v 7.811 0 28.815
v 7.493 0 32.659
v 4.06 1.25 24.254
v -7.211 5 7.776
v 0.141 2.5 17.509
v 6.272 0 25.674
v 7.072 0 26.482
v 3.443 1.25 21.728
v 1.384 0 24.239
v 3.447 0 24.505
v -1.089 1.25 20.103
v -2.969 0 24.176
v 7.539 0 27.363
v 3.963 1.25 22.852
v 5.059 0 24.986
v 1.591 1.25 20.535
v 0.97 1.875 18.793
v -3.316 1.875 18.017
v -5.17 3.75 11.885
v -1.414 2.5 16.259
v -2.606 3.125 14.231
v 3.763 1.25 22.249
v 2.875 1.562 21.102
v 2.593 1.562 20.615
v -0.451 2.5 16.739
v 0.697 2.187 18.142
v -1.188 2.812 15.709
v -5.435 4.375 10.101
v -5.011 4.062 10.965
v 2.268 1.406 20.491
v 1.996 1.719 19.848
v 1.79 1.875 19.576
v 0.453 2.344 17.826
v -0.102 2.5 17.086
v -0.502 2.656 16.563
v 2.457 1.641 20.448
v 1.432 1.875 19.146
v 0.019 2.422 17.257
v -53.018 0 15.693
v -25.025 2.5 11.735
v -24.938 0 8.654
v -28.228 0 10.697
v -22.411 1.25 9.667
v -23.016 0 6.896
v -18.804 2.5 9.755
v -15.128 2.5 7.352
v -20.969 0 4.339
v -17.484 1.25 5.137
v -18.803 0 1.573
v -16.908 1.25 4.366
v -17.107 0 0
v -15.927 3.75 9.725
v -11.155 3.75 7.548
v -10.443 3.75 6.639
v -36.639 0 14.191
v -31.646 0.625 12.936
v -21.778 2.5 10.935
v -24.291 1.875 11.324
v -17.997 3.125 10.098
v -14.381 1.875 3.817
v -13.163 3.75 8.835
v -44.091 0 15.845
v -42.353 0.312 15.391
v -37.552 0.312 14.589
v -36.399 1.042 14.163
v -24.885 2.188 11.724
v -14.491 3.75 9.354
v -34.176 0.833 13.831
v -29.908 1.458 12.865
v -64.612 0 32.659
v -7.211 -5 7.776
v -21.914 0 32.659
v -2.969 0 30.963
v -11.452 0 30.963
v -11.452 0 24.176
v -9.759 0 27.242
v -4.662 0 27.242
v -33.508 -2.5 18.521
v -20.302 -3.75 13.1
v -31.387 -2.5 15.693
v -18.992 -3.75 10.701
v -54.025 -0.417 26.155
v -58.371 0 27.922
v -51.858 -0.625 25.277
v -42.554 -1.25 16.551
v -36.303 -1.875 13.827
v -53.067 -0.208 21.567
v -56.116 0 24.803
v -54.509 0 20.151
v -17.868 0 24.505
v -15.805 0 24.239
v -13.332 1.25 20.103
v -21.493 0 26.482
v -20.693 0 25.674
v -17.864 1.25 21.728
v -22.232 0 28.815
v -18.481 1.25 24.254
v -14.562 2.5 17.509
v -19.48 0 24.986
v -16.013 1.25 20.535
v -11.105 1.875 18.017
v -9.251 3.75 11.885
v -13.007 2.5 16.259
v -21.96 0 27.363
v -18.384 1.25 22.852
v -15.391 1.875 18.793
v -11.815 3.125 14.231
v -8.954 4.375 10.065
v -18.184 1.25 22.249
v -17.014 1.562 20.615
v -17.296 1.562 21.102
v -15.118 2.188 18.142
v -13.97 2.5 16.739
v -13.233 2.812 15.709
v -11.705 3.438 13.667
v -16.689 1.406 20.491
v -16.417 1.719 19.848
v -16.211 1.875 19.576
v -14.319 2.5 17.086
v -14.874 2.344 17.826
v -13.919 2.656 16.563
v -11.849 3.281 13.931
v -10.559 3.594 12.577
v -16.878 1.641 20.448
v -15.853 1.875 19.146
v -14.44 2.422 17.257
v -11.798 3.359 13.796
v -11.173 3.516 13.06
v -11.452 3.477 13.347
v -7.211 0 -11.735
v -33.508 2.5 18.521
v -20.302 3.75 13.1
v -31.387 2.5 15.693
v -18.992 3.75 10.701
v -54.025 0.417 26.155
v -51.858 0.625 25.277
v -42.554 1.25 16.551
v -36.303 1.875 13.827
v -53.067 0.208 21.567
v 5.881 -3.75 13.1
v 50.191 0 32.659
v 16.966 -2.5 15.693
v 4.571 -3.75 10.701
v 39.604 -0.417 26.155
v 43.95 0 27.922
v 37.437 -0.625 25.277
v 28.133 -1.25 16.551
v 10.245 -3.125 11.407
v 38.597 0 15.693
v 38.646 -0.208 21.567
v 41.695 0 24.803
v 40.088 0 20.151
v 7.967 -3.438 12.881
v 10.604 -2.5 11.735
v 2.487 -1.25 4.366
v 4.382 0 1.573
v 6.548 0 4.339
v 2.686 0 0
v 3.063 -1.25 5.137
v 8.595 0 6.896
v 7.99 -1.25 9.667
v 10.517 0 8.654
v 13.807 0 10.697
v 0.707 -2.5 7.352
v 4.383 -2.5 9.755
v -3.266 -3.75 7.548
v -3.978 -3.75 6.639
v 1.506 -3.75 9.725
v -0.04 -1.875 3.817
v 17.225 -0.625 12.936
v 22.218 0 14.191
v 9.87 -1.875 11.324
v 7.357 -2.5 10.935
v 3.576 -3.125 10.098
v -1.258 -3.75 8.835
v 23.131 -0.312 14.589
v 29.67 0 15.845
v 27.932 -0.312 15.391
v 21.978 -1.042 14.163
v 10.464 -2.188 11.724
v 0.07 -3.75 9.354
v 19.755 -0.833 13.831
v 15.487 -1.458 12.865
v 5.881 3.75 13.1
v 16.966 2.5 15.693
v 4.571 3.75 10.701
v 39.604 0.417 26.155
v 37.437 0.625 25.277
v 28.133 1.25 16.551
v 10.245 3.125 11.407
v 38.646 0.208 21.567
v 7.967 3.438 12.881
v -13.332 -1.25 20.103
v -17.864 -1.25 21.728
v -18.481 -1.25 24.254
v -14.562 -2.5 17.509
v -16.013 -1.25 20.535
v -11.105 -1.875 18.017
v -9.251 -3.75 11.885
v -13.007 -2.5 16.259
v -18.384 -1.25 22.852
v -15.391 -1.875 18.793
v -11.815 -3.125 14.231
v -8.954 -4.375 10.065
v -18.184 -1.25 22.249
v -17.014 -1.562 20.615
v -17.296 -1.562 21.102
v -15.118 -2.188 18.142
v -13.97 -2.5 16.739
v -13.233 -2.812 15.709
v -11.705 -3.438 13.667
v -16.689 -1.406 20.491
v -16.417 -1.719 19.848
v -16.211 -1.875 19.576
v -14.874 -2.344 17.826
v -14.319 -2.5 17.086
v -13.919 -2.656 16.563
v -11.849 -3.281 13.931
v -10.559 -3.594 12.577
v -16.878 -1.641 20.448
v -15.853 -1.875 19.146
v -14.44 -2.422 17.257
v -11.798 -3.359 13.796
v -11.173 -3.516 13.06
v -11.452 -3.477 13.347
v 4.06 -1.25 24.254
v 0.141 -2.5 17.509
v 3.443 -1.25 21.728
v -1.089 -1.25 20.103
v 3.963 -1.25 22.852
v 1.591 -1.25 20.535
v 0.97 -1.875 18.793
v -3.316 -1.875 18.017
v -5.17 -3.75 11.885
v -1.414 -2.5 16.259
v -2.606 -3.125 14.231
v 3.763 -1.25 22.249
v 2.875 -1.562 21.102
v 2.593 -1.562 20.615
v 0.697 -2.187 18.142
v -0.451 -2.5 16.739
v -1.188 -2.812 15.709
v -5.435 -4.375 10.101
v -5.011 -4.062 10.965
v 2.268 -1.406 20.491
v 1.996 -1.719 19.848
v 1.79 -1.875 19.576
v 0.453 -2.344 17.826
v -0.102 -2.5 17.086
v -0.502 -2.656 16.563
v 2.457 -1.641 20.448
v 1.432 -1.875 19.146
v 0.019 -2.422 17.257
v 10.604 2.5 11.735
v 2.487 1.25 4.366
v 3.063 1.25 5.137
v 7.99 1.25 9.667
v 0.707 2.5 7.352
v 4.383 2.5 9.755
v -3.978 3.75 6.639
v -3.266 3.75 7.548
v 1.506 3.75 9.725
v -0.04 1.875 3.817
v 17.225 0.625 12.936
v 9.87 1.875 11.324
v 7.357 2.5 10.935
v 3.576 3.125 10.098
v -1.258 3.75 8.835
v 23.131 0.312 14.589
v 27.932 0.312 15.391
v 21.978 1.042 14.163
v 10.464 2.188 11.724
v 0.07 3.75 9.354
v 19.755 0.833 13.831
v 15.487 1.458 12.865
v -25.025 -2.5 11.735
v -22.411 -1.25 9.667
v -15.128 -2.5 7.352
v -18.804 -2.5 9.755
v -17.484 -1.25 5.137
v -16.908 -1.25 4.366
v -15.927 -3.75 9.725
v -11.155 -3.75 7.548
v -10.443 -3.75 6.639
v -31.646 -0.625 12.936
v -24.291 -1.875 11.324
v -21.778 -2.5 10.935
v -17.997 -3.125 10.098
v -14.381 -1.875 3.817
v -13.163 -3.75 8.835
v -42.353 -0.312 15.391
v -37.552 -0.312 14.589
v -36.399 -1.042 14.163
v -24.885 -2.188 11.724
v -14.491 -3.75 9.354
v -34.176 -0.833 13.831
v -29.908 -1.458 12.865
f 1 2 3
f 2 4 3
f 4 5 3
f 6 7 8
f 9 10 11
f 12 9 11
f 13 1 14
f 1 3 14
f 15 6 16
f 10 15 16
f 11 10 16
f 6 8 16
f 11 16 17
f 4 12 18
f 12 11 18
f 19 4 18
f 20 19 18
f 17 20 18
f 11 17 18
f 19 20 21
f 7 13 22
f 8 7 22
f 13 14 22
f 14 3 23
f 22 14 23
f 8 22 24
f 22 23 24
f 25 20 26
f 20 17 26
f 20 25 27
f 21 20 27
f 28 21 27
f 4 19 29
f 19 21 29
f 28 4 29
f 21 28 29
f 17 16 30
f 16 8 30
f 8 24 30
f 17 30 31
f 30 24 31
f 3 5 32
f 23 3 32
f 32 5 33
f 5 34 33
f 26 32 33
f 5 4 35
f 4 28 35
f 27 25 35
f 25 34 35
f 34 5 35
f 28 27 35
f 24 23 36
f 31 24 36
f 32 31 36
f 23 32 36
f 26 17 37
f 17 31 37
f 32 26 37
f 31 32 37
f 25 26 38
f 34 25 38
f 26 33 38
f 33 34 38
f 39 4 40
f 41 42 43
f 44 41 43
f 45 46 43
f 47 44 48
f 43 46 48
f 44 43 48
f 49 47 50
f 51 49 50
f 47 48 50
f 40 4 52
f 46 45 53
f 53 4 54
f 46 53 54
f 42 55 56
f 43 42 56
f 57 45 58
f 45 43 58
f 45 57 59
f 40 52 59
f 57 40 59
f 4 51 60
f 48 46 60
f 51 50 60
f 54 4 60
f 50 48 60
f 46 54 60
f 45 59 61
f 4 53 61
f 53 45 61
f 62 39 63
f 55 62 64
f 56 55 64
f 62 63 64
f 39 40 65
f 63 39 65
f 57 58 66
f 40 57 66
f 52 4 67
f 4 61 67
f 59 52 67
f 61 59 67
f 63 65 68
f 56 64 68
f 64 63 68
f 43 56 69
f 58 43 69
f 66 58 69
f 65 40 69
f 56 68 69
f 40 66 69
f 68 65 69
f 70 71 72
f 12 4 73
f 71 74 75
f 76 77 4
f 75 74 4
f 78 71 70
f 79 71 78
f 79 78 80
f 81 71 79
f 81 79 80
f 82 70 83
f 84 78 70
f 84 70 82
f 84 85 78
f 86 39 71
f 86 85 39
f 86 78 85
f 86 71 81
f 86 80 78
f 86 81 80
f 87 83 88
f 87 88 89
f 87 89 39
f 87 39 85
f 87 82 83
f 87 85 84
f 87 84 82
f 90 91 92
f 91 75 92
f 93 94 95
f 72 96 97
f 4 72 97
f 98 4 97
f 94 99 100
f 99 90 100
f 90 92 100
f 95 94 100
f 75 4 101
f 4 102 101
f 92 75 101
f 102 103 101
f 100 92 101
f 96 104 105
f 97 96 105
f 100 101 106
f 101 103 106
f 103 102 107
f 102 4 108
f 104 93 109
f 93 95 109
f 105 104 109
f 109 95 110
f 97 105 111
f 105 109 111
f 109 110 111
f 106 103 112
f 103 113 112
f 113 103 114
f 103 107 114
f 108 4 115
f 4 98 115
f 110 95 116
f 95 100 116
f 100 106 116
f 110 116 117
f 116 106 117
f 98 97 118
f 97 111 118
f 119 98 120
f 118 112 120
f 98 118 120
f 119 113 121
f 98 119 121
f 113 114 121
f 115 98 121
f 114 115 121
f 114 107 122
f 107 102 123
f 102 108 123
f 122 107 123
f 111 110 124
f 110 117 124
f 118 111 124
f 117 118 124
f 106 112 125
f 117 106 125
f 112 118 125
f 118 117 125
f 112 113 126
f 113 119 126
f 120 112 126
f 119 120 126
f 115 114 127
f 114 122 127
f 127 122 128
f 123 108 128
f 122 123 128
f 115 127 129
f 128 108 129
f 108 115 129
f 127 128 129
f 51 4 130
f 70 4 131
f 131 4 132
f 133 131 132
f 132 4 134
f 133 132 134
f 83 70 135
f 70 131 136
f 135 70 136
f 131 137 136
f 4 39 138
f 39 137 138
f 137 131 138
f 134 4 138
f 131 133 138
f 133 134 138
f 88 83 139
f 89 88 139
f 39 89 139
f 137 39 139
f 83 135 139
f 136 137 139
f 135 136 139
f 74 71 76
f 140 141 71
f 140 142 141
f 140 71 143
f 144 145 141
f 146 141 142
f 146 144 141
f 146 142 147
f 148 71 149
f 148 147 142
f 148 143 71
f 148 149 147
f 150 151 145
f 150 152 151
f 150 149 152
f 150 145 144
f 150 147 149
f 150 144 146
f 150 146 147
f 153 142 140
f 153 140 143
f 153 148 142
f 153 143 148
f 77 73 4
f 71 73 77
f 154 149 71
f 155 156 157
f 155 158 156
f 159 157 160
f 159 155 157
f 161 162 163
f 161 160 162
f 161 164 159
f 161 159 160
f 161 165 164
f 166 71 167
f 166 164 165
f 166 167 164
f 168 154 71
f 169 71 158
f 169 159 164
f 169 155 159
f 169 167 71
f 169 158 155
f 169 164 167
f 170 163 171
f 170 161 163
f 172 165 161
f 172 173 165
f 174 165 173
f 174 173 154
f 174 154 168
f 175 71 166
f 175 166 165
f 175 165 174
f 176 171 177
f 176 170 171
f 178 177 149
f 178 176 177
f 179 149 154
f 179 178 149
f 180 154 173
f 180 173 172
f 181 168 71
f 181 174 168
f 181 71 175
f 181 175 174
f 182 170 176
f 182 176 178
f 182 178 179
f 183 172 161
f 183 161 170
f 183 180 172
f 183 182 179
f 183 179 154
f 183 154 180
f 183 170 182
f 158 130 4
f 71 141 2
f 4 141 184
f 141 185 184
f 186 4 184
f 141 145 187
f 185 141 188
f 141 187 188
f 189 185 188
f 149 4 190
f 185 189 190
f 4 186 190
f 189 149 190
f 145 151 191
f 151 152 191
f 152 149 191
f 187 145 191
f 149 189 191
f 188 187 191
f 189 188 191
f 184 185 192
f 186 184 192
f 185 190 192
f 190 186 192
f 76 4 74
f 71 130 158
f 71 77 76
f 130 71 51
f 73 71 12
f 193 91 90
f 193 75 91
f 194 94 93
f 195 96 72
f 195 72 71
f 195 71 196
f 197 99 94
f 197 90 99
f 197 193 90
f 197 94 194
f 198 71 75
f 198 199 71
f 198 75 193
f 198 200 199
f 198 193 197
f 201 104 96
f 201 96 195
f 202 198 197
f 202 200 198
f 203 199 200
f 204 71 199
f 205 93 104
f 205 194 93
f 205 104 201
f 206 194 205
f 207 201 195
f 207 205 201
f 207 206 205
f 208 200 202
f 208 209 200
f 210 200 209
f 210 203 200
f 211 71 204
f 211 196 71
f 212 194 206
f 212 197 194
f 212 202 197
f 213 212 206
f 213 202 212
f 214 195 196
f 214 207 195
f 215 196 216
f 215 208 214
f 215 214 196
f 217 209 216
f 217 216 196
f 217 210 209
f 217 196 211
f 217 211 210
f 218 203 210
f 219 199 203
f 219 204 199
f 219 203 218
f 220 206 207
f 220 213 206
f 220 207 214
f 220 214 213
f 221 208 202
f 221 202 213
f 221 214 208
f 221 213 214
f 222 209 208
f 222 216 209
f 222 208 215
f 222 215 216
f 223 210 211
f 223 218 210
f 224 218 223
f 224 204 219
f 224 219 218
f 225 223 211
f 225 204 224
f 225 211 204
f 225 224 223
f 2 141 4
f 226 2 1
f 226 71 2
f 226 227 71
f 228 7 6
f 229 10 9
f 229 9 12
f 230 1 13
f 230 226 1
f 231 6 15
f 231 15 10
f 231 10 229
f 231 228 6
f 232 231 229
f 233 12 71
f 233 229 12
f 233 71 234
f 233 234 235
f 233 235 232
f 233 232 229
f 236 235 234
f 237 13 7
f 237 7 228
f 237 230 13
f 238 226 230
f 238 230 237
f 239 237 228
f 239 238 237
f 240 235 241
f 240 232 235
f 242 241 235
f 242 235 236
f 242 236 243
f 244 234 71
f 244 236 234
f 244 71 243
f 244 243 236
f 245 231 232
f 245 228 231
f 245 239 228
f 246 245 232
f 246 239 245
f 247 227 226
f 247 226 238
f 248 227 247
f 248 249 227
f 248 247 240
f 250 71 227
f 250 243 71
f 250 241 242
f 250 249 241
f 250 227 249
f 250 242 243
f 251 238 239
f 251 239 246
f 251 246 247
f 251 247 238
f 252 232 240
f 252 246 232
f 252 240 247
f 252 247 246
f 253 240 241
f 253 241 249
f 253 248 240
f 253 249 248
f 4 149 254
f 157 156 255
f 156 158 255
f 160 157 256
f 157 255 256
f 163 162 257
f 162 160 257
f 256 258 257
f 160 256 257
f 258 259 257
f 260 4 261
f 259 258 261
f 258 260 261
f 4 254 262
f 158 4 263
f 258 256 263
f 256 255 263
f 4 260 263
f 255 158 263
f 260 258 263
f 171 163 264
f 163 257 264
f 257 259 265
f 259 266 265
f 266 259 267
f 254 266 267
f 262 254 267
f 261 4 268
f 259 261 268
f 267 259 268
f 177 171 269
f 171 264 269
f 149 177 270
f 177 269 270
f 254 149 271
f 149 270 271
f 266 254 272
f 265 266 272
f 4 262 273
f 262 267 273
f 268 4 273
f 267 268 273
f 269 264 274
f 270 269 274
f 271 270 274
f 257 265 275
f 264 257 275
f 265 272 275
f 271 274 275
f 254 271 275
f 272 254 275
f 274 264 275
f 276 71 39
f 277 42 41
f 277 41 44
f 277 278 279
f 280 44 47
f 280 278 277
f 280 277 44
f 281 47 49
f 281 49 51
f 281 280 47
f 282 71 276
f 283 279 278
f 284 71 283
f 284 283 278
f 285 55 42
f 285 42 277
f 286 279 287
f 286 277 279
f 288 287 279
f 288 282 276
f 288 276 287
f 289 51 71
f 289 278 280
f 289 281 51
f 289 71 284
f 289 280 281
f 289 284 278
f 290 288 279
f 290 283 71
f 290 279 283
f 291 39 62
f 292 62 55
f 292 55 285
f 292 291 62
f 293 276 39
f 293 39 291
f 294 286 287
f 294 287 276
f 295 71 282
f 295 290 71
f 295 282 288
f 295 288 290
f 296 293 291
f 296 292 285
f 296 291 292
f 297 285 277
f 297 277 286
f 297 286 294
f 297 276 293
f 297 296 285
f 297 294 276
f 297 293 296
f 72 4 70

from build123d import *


with BuildPart() as f3:
    # F0 (on Front) → F3 section 0
    with BuildSketch(Plane.XZ, mode=Mode.PRIVATE) as f3_s0:
        with BuildLine():
            Line((-21.9142735004, 32.6593369246), (-64.6117627621, 32.6593369246))
            add(Edge.make_bspline(
                [(-64.6117627621, 32.6593369246), (-63.1112154786, 31.6044133494), (-59.4897111338, 29.4798106269), (-54.8402694545, 24.0083886157), (-54.1776311477, 17.803548493), (-53.0184023082, 15.6934484839)],
                knots=[0, 0, 0, 0, 0.3044179075, 0.6380886555, 1, 1, 1, 1], degree=3))
            add(Edge.make_bspline(
                [(-53.0184023082, 15.6934484839), (-50.397152359, 15.9517944961), (-42.4564652069, 16.5735141568), (-30.3318480055, 11.9726995365), (-22.6326325716, 7.7807102957), (-19.3285813991, 1.5879180834), (-17.1072725207, 0)],
                knots=[0, 0, 0, 0, 0.2494885994, 0.5320392712, 0.7637954486, 1, 1, 1, 1], degree=3))
            Line((-17.1072725207, 0), (-7.2105028667, -11.7347398773))
            Line((-7.2105028667, -11.7347398773), (2.6862667874, 0))
            add(Edge.make_bspline(
                [(38.5973965749, 15.6934484839), (35.9761466257, 15.9517944961), (28.0354594736, 16.5735141568), (15.9108422722, 11.9726995365), (8.2116268383, 7.7807102957), (4.9075756658, 1.5879180834), (2.6862667874, 0)],
                knots=[0, 0, 0, 0, 0.2494885994, 0.5320392712, 0.7637954486, 1, 1, 1, 1], degree=3))
            add(Edge.make_bspline(
                [(50.1907570288, 32.6593369246), (48.6902097453, 31.6044133494), (45.0687054005, 29.4798106269), (40.4192637212, 24.0083886157), (39.7566254144, 17.803548493), (38.5973965749, 15.6934484839)],
                knots=[0, 0, 0, 0, 0.3044179075, 0.6380886555, 1, 1, 1, 1], degree=3))
            Line((50.1907570288, 32.6593369246), (7.4932677671, 32.6593369246))
            add(Edge.make_bspline(
                [(7.4932677671, 32.6593369246), (7.7789275206, 30.681626577), (8.3182882425, 26.9541985329), (4.3276740221, 24.1005648406), (-0.3013873529, 24.1408897918), (-2.9690302908, 24.1763927042)],
                knots=[0, 0, 0, 0, 0.3305961482, 0.6143190537, 1, 1, 1, 1], degree=3))
            Line((-2.9690302908, 24.1763927042), (-2.9690302908, 30.962748453))
            Line((-2.9690302908, 30.962748453), (-4.662130028, 27.2415857762))
            Line((-4.662130028, 27.2415857762), (-7.2105028667, 27.2415857762))
            Line((-7.2105028667, 27.2415857762), (-9.7588757053, 27.2415857762))
            Line((-9.7588757053, 27.2415857762), (-11.4519754425, 30.962748453))
            Line((-11.4519754425, 30.962748453), (-11.4519754425, 24.1763927042))
            add(Edge.make_bspline(
                [(-21.9142735004, 32.6593369246), (-22.199933254, 30.681626577), (-22.7392939758, 26.9541985329), (-18.7486797554, 24.1005648406), (-14.1196183804, 24.1408897918), (-11.4519754425, 24.1763927042)],
                knots=[0, 0, 0, 0, 0.3305961482, 0.6143190537, 1, 1, 1, 1], degree=3))
        make_face()
    loft([f3_s0.sketch, Vertex(-7.2105028667, -5, 7.7760326676)])

    # F0 (on Front) → F6 section 0
    with BuildSketch(Plane.XZ, mode=Mode.PRIVATE) as f6_s0:
        with BuildLine():
            Line((-21.9142735004, 32.6593369246), (-64.6117627621, 32.6593369246))
            add(Edge.make_bspline(
                [(-64.6117627621, 32.6593369246), (-63.1112154786, 31.6044133494), (-59.4897111338, 29.4798106269), (-54.8402694545, 24.0083886157), (-54.1776311477, 17.803548493), (-53.0184023082, 15.6934484839)],
                knots=[0, 0, 0, 0, 0.3044179075, 0.6380886555, 1, 1, 1, 1], degree=3))
            add(Edge.make_bspline(
                [(-53.0184023082, 15.6934484839), (-50.397152359, 15.9517944961), (-42.4564652069, 16.5735141568), (-30.3318480055, 11.9726995365), (-22.6326325716, 7.7807102957), (-19.3285813991, 1.5879180834), (-17.1072725207, 0)],
                knots=[0, 0, 0, 0, 0.2494885994, 0.5320392712, 0.7637954486, 1, 1, 1, 1], degree=3))
            Line((-17.1072725207, 0), (-7.2105028667, -11.7347398773))
            Line((-7.2105028667, -11.7347398773), (2.6862667874, 0))
            add(Edge.make_bspline(
                [(38.5973965749, 15.6934484839), (35.9761466257, 15.9517944961), (28.0354594736, 16.5735141568), (15.9108422722, 11.9726995365), (8.2116268383, 7.7807102957), (4.9075756658, 1.5879180834), (2.6862667874, 0)],
                knots=[0, 0, 0, 0, 0.2494885994, 0.5320392712, 0.7637954486, 1, 1, 1, 1], degree=3))
            add(Edge.make_bspline(
                [(50.1907570288, 32.6593369246), (48.6902097453, 31.6044133494), (45.0687054005, 29.4798106269), (40.4192637212, 24.0083886157), (39.7566254144, 17.803548493), (38.5973965749, 15.6934484839)],
                knots=[0, 0, 0, 0, 0.3044179075, 0.6380886555, 1, 1, 1, 1], degree=3))
            Line((50.1907570288, 32.6593369246), (7.4932677671, 32.6593369246))
            add(Edge.make_bspline(
                [(7.4932677671, 32.6593369246), (7.7789275206, 30.681626577), (8.3182882425, 26.9541985329), (4.3276740221, 24.1005648406), (-0.3013873529, 24.1408897918), (-2.9690302908, 24.1763927042)],
                knots=[0, 0, 0, 0, 0.3305961482, 0.6143190537, 1, 1, 1, 1], degree=3))
            Line((-2.9690302908, 24.1763927042), (-2.9690302908, 30.962748453))
            Line((-2.9690302908, 30.962748453), (-4.662130028, 27.2415857762))
            Line((-4.662130028, 27.2415857762), (-7.2105028667, 27.2415857762))
            Line((-7.2105028667, 27.2415857762), (-9.7588757053, 27.2415857762))
            Line((-9.7588757053, 27.2415857762), (-11.4519754425, 30.962748453))
            Line((-11.4519754425, 30.962748453), (-11.4519754425, 24.1763927042))
            add(Edge.make_bspline(
                [(-21.9142735004, 32.6593369246), (-22.199933254, 30.681626577), (-22.7392939758, 26.9541985329), (-18.7486797554, 24.1005648406), (-14.1196183804, 24.1408897918), (-11.4519754425, 24.1763927042)],
                knots=[0, 0, 0, 0, 0.3305961482, 0.6143190537, 1, 1, 1, 1], degree=3))
        make_face()
    loft([f6_s0.sketch, Vertex(-7.2105028667, 5, 7.7760326676)])


solid = f3.part
